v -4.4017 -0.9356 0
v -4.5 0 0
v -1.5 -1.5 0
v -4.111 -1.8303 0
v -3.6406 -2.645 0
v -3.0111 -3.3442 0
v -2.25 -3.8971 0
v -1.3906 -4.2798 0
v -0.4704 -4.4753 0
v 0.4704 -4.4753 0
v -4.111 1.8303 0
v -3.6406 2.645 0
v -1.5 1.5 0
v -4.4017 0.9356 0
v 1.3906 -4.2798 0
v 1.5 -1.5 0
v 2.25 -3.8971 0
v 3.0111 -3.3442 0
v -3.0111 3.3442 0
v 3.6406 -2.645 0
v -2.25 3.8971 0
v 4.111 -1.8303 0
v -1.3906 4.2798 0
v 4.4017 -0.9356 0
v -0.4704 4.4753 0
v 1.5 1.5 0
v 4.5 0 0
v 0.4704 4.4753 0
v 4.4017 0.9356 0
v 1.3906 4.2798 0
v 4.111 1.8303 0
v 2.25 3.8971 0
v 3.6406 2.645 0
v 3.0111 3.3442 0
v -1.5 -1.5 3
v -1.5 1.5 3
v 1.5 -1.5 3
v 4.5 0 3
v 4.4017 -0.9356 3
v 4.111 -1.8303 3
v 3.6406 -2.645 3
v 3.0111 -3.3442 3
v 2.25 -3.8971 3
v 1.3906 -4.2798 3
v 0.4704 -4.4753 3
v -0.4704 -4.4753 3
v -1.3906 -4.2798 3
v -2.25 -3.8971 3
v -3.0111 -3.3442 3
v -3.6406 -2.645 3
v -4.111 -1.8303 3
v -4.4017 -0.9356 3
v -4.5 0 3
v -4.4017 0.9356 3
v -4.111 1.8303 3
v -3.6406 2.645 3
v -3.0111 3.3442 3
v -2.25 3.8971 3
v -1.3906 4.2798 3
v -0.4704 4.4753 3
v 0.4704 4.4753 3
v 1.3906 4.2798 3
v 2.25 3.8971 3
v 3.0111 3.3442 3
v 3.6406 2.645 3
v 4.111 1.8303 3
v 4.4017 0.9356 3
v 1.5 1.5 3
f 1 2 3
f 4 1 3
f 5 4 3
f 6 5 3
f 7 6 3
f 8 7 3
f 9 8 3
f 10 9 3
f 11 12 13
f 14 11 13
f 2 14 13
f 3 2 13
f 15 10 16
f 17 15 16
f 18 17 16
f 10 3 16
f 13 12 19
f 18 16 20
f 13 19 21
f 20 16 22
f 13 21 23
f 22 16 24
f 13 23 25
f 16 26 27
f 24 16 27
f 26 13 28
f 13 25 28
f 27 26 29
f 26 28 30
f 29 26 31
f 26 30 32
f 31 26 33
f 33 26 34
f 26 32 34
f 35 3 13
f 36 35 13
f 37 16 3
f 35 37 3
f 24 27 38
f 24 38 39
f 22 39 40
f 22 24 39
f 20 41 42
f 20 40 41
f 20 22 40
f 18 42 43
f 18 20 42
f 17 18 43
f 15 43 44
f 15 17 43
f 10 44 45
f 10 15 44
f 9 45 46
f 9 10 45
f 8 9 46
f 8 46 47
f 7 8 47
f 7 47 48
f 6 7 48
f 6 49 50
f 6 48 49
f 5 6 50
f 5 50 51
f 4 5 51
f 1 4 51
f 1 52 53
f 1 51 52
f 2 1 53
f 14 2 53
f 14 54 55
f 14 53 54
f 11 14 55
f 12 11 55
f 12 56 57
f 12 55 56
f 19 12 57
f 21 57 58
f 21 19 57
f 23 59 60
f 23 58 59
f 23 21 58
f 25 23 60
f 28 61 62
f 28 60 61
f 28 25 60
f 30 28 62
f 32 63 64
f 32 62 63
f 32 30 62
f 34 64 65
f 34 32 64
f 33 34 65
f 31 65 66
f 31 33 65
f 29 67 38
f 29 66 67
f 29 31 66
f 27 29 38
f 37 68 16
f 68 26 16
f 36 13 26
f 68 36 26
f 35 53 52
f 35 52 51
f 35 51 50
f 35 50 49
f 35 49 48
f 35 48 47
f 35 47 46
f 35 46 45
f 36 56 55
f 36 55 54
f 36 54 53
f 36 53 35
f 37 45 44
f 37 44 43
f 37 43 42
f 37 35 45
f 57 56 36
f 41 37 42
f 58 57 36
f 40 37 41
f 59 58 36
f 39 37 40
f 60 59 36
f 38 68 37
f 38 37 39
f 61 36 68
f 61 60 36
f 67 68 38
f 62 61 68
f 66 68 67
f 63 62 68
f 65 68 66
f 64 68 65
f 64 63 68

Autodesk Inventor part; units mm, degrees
ref_plane "YZ Plane" through (0, 0, 0) normal (1, 0, 0) x (0, 1, 0)
ref_plane "XZ Plane" through (0, 0, 0) normal (0, 1, 0) x (-1, 0, 0)
ref_plane "XY Plane" through (0, 0, 0) normal (0, 0, 1) x (1, 0, 0)
sketch "Esboço1" plane through (0, 0, 0) normal (0, 0, 1) x (1, 0, 0)
  circle A0 centre (0, 0) radius 4.5
  line L0 (-1.5, 1.5) -> (1.5, 1.5)
  line L1 (1.5, 1.5) -> (1.5, -1.5)
  line L2 (1.5, -1.5) -> (-1.5, -1.5)
  line L3 (-1.5, -1.5) -> (-1.5, 1.5)
extrude "Extrusão1" add sketch "Esboço1" along normal blind 3
properties part number "TRAVA_HELICE"
